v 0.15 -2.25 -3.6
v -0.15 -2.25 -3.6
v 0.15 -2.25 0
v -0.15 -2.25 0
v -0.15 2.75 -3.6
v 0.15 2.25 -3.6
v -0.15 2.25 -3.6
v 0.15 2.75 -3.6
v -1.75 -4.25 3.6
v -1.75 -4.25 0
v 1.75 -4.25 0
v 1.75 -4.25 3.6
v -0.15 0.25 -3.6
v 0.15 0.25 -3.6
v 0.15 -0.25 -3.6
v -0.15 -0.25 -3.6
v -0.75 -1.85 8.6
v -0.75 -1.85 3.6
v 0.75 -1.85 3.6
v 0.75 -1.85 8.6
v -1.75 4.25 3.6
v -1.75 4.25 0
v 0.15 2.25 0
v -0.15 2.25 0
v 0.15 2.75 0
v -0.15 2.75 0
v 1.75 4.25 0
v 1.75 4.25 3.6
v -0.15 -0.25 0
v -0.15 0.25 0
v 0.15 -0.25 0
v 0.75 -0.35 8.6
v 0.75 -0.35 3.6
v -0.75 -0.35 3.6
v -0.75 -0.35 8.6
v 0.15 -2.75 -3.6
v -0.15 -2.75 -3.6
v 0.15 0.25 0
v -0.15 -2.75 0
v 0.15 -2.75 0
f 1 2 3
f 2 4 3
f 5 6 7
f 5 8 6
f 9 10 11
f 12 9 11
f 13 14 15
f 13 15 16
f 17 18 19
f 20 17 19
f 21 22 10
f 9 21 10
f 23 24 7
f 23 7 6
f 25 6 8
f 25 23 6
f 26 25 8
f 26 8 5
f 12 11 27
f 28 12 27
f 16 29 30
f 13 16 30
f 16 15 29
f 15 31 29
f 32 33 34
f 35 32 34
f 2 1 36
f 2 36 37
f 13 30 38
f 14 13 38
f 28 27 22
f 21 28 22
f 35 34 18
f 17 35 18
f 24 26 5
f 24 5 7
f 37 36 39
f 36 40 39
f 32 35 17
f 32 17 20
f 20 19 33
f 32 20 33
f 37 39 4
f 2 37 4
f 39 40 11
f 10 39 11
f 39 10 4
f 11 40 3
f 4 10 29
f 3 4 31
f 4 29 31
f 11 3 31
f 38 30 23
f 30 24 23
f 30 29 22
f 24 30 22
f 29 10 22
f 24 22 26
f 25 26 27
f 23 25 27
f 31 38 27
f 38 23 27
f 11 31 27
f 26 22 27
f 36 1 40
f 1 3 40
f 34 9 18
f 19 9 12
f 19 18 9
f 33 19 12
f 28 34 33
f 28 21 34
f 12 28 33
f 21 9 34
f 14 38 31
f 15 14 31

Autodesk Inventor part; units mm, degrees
ref_plane "YZ Plane" through (0, 0, 0) normal (1, 0, 0) x (0, 1, 0)
ref_plane "XZ Plane" through (0, 0, 0) normal (0, 1, 0) x (-1, 0, 0)
ref_plane "XY Plane" through (0, 0, 0) normal (0, 0, 1) x (1, 0, 0)
sketch "スケッチ1" plane through (0, 0, 0) normal (0, 0, 1) x (1, 0, 0)
  line L0 (-1.75, -4.25) -> (1.75, -4.25)
  line L1 (1.75, -4.25) -> (1.75, 4.25)
  line L2 (1.75, 4.25) -> (-1.75, 4.25)
  line L3 (-1.75, 4.25) -> (-1.75, -4.25)
  line L4 (-1.75, -4.25) -> (1.75, 4.25) construction
  line L5 (1.75, -4.25) -> (-1.75, 4.25) construction
  point P0 (0, 0)
  dimension "d0" = 8.5
  dimension "d1" = 3.5
extrude "押し出し1" add sketch "スケッチ1" along normal blind 3.6
sketch "スケッチ2" plane through (0, 0, 3.6) normal (0, 0, 1) x (1, 0, 0)
  line L0 (-0.75, 1.85) -> (0.75, 1.85) construction
  line L1 (0.75, 1.85) -> (0.75, -1.85) construction
  line L2 (0.75, -1.85) -> (-0.75, -1.85) construction
  line L3 (-0.75, -1.85) -> (-0.75, 1.85) construction
  line L4 (-0.75, 1.85) -> (0.75, -1.85) construction
  line L5 (0.75, 1.85) -> (-0.75, -1.85) construction
  line L6 (-0.75, -1.85) -> (0.75, -1.85)
  line L7 (0.75, -1.85) -> (0.75, -0.35)
  line L8 (0.75, -0.35) -> (-0.75, -0.35)
  line L9 (-0.75, -0.35) -> (-0.75, -1.85)
  point P0 (0, 0)
  dimension "d4" = 3.7
  dimension "d5" = 1.5
  dimension "d6" = 1.5
extrude "押し出し2" add sketch "スケッチ2" along normal blind 5
sketch "スケッチ3" plane through (0, 0, 0) normal (0, 0, -1) x (-1, 0, 0)
  line L0 (-0.15, -2.75) -> (0.15, -2.75) construction
  line L1 (0.15, -2.75) -> (0.15, 2.75) construction
  line L2 (0.15, 2.75) -> (-0.15, 2.75) construction
  line L3 (-0.15, 2.75) -> (-0.15, -2.75) construction
  line L4 (-0.15, -2.75) -> (0.15, 2.75) construction
  line L5 (0.15, -2.75) -> (-0.15, 2.75) construction
  line L6 (-0.15, 2.75) -> (0.15, 2.75)
  line L7 (0.15, 2.75) -> (0.15, 2.25)
  line L8 (0.15, 2.25) -> (-0.15, 2.25)
  line L9 (-0.15, 2.25) -> (-0.15, 2.75)
  line L10 (-0.15, -0.25) -> (0.15, -0.25)
  line L11 (0.15, -0.25) -> (0.15, 0.25)
  line L12 (0.15, 0.25) -> (-0.15, 0.25)
  line L13 (-0.15, 0.25) -> (-0.15, -0.25)
  line L14 (-0.15, -0.25) -> (0.15, 0.25) construction
  line L15 (0.15, -0.25) -> (-0.15, 0.25) construction
  line L16 (-0.15, -2.75) -> (0.15, -2.75)
  line L17 (0.15, -2.75) -> (0.15, -2.25)
  line L18 (0.15, -2.25) -> (-0.15, -2.25)
  line L19 (-0.15, -2.25) -> (-0.15, -2.75)
  point P0 (0, 0)
  dimension "d9" = 0.3
  dimension "d10" = 5.5
  dimension "d11" = 0.5
  dimension "d12" = 0.5
  dimension "d13" = 0.5
extrude "押し出し3" add sketch "スケッチ3" along normal blind 3.6
properties part number "SS-12D00-G5"
